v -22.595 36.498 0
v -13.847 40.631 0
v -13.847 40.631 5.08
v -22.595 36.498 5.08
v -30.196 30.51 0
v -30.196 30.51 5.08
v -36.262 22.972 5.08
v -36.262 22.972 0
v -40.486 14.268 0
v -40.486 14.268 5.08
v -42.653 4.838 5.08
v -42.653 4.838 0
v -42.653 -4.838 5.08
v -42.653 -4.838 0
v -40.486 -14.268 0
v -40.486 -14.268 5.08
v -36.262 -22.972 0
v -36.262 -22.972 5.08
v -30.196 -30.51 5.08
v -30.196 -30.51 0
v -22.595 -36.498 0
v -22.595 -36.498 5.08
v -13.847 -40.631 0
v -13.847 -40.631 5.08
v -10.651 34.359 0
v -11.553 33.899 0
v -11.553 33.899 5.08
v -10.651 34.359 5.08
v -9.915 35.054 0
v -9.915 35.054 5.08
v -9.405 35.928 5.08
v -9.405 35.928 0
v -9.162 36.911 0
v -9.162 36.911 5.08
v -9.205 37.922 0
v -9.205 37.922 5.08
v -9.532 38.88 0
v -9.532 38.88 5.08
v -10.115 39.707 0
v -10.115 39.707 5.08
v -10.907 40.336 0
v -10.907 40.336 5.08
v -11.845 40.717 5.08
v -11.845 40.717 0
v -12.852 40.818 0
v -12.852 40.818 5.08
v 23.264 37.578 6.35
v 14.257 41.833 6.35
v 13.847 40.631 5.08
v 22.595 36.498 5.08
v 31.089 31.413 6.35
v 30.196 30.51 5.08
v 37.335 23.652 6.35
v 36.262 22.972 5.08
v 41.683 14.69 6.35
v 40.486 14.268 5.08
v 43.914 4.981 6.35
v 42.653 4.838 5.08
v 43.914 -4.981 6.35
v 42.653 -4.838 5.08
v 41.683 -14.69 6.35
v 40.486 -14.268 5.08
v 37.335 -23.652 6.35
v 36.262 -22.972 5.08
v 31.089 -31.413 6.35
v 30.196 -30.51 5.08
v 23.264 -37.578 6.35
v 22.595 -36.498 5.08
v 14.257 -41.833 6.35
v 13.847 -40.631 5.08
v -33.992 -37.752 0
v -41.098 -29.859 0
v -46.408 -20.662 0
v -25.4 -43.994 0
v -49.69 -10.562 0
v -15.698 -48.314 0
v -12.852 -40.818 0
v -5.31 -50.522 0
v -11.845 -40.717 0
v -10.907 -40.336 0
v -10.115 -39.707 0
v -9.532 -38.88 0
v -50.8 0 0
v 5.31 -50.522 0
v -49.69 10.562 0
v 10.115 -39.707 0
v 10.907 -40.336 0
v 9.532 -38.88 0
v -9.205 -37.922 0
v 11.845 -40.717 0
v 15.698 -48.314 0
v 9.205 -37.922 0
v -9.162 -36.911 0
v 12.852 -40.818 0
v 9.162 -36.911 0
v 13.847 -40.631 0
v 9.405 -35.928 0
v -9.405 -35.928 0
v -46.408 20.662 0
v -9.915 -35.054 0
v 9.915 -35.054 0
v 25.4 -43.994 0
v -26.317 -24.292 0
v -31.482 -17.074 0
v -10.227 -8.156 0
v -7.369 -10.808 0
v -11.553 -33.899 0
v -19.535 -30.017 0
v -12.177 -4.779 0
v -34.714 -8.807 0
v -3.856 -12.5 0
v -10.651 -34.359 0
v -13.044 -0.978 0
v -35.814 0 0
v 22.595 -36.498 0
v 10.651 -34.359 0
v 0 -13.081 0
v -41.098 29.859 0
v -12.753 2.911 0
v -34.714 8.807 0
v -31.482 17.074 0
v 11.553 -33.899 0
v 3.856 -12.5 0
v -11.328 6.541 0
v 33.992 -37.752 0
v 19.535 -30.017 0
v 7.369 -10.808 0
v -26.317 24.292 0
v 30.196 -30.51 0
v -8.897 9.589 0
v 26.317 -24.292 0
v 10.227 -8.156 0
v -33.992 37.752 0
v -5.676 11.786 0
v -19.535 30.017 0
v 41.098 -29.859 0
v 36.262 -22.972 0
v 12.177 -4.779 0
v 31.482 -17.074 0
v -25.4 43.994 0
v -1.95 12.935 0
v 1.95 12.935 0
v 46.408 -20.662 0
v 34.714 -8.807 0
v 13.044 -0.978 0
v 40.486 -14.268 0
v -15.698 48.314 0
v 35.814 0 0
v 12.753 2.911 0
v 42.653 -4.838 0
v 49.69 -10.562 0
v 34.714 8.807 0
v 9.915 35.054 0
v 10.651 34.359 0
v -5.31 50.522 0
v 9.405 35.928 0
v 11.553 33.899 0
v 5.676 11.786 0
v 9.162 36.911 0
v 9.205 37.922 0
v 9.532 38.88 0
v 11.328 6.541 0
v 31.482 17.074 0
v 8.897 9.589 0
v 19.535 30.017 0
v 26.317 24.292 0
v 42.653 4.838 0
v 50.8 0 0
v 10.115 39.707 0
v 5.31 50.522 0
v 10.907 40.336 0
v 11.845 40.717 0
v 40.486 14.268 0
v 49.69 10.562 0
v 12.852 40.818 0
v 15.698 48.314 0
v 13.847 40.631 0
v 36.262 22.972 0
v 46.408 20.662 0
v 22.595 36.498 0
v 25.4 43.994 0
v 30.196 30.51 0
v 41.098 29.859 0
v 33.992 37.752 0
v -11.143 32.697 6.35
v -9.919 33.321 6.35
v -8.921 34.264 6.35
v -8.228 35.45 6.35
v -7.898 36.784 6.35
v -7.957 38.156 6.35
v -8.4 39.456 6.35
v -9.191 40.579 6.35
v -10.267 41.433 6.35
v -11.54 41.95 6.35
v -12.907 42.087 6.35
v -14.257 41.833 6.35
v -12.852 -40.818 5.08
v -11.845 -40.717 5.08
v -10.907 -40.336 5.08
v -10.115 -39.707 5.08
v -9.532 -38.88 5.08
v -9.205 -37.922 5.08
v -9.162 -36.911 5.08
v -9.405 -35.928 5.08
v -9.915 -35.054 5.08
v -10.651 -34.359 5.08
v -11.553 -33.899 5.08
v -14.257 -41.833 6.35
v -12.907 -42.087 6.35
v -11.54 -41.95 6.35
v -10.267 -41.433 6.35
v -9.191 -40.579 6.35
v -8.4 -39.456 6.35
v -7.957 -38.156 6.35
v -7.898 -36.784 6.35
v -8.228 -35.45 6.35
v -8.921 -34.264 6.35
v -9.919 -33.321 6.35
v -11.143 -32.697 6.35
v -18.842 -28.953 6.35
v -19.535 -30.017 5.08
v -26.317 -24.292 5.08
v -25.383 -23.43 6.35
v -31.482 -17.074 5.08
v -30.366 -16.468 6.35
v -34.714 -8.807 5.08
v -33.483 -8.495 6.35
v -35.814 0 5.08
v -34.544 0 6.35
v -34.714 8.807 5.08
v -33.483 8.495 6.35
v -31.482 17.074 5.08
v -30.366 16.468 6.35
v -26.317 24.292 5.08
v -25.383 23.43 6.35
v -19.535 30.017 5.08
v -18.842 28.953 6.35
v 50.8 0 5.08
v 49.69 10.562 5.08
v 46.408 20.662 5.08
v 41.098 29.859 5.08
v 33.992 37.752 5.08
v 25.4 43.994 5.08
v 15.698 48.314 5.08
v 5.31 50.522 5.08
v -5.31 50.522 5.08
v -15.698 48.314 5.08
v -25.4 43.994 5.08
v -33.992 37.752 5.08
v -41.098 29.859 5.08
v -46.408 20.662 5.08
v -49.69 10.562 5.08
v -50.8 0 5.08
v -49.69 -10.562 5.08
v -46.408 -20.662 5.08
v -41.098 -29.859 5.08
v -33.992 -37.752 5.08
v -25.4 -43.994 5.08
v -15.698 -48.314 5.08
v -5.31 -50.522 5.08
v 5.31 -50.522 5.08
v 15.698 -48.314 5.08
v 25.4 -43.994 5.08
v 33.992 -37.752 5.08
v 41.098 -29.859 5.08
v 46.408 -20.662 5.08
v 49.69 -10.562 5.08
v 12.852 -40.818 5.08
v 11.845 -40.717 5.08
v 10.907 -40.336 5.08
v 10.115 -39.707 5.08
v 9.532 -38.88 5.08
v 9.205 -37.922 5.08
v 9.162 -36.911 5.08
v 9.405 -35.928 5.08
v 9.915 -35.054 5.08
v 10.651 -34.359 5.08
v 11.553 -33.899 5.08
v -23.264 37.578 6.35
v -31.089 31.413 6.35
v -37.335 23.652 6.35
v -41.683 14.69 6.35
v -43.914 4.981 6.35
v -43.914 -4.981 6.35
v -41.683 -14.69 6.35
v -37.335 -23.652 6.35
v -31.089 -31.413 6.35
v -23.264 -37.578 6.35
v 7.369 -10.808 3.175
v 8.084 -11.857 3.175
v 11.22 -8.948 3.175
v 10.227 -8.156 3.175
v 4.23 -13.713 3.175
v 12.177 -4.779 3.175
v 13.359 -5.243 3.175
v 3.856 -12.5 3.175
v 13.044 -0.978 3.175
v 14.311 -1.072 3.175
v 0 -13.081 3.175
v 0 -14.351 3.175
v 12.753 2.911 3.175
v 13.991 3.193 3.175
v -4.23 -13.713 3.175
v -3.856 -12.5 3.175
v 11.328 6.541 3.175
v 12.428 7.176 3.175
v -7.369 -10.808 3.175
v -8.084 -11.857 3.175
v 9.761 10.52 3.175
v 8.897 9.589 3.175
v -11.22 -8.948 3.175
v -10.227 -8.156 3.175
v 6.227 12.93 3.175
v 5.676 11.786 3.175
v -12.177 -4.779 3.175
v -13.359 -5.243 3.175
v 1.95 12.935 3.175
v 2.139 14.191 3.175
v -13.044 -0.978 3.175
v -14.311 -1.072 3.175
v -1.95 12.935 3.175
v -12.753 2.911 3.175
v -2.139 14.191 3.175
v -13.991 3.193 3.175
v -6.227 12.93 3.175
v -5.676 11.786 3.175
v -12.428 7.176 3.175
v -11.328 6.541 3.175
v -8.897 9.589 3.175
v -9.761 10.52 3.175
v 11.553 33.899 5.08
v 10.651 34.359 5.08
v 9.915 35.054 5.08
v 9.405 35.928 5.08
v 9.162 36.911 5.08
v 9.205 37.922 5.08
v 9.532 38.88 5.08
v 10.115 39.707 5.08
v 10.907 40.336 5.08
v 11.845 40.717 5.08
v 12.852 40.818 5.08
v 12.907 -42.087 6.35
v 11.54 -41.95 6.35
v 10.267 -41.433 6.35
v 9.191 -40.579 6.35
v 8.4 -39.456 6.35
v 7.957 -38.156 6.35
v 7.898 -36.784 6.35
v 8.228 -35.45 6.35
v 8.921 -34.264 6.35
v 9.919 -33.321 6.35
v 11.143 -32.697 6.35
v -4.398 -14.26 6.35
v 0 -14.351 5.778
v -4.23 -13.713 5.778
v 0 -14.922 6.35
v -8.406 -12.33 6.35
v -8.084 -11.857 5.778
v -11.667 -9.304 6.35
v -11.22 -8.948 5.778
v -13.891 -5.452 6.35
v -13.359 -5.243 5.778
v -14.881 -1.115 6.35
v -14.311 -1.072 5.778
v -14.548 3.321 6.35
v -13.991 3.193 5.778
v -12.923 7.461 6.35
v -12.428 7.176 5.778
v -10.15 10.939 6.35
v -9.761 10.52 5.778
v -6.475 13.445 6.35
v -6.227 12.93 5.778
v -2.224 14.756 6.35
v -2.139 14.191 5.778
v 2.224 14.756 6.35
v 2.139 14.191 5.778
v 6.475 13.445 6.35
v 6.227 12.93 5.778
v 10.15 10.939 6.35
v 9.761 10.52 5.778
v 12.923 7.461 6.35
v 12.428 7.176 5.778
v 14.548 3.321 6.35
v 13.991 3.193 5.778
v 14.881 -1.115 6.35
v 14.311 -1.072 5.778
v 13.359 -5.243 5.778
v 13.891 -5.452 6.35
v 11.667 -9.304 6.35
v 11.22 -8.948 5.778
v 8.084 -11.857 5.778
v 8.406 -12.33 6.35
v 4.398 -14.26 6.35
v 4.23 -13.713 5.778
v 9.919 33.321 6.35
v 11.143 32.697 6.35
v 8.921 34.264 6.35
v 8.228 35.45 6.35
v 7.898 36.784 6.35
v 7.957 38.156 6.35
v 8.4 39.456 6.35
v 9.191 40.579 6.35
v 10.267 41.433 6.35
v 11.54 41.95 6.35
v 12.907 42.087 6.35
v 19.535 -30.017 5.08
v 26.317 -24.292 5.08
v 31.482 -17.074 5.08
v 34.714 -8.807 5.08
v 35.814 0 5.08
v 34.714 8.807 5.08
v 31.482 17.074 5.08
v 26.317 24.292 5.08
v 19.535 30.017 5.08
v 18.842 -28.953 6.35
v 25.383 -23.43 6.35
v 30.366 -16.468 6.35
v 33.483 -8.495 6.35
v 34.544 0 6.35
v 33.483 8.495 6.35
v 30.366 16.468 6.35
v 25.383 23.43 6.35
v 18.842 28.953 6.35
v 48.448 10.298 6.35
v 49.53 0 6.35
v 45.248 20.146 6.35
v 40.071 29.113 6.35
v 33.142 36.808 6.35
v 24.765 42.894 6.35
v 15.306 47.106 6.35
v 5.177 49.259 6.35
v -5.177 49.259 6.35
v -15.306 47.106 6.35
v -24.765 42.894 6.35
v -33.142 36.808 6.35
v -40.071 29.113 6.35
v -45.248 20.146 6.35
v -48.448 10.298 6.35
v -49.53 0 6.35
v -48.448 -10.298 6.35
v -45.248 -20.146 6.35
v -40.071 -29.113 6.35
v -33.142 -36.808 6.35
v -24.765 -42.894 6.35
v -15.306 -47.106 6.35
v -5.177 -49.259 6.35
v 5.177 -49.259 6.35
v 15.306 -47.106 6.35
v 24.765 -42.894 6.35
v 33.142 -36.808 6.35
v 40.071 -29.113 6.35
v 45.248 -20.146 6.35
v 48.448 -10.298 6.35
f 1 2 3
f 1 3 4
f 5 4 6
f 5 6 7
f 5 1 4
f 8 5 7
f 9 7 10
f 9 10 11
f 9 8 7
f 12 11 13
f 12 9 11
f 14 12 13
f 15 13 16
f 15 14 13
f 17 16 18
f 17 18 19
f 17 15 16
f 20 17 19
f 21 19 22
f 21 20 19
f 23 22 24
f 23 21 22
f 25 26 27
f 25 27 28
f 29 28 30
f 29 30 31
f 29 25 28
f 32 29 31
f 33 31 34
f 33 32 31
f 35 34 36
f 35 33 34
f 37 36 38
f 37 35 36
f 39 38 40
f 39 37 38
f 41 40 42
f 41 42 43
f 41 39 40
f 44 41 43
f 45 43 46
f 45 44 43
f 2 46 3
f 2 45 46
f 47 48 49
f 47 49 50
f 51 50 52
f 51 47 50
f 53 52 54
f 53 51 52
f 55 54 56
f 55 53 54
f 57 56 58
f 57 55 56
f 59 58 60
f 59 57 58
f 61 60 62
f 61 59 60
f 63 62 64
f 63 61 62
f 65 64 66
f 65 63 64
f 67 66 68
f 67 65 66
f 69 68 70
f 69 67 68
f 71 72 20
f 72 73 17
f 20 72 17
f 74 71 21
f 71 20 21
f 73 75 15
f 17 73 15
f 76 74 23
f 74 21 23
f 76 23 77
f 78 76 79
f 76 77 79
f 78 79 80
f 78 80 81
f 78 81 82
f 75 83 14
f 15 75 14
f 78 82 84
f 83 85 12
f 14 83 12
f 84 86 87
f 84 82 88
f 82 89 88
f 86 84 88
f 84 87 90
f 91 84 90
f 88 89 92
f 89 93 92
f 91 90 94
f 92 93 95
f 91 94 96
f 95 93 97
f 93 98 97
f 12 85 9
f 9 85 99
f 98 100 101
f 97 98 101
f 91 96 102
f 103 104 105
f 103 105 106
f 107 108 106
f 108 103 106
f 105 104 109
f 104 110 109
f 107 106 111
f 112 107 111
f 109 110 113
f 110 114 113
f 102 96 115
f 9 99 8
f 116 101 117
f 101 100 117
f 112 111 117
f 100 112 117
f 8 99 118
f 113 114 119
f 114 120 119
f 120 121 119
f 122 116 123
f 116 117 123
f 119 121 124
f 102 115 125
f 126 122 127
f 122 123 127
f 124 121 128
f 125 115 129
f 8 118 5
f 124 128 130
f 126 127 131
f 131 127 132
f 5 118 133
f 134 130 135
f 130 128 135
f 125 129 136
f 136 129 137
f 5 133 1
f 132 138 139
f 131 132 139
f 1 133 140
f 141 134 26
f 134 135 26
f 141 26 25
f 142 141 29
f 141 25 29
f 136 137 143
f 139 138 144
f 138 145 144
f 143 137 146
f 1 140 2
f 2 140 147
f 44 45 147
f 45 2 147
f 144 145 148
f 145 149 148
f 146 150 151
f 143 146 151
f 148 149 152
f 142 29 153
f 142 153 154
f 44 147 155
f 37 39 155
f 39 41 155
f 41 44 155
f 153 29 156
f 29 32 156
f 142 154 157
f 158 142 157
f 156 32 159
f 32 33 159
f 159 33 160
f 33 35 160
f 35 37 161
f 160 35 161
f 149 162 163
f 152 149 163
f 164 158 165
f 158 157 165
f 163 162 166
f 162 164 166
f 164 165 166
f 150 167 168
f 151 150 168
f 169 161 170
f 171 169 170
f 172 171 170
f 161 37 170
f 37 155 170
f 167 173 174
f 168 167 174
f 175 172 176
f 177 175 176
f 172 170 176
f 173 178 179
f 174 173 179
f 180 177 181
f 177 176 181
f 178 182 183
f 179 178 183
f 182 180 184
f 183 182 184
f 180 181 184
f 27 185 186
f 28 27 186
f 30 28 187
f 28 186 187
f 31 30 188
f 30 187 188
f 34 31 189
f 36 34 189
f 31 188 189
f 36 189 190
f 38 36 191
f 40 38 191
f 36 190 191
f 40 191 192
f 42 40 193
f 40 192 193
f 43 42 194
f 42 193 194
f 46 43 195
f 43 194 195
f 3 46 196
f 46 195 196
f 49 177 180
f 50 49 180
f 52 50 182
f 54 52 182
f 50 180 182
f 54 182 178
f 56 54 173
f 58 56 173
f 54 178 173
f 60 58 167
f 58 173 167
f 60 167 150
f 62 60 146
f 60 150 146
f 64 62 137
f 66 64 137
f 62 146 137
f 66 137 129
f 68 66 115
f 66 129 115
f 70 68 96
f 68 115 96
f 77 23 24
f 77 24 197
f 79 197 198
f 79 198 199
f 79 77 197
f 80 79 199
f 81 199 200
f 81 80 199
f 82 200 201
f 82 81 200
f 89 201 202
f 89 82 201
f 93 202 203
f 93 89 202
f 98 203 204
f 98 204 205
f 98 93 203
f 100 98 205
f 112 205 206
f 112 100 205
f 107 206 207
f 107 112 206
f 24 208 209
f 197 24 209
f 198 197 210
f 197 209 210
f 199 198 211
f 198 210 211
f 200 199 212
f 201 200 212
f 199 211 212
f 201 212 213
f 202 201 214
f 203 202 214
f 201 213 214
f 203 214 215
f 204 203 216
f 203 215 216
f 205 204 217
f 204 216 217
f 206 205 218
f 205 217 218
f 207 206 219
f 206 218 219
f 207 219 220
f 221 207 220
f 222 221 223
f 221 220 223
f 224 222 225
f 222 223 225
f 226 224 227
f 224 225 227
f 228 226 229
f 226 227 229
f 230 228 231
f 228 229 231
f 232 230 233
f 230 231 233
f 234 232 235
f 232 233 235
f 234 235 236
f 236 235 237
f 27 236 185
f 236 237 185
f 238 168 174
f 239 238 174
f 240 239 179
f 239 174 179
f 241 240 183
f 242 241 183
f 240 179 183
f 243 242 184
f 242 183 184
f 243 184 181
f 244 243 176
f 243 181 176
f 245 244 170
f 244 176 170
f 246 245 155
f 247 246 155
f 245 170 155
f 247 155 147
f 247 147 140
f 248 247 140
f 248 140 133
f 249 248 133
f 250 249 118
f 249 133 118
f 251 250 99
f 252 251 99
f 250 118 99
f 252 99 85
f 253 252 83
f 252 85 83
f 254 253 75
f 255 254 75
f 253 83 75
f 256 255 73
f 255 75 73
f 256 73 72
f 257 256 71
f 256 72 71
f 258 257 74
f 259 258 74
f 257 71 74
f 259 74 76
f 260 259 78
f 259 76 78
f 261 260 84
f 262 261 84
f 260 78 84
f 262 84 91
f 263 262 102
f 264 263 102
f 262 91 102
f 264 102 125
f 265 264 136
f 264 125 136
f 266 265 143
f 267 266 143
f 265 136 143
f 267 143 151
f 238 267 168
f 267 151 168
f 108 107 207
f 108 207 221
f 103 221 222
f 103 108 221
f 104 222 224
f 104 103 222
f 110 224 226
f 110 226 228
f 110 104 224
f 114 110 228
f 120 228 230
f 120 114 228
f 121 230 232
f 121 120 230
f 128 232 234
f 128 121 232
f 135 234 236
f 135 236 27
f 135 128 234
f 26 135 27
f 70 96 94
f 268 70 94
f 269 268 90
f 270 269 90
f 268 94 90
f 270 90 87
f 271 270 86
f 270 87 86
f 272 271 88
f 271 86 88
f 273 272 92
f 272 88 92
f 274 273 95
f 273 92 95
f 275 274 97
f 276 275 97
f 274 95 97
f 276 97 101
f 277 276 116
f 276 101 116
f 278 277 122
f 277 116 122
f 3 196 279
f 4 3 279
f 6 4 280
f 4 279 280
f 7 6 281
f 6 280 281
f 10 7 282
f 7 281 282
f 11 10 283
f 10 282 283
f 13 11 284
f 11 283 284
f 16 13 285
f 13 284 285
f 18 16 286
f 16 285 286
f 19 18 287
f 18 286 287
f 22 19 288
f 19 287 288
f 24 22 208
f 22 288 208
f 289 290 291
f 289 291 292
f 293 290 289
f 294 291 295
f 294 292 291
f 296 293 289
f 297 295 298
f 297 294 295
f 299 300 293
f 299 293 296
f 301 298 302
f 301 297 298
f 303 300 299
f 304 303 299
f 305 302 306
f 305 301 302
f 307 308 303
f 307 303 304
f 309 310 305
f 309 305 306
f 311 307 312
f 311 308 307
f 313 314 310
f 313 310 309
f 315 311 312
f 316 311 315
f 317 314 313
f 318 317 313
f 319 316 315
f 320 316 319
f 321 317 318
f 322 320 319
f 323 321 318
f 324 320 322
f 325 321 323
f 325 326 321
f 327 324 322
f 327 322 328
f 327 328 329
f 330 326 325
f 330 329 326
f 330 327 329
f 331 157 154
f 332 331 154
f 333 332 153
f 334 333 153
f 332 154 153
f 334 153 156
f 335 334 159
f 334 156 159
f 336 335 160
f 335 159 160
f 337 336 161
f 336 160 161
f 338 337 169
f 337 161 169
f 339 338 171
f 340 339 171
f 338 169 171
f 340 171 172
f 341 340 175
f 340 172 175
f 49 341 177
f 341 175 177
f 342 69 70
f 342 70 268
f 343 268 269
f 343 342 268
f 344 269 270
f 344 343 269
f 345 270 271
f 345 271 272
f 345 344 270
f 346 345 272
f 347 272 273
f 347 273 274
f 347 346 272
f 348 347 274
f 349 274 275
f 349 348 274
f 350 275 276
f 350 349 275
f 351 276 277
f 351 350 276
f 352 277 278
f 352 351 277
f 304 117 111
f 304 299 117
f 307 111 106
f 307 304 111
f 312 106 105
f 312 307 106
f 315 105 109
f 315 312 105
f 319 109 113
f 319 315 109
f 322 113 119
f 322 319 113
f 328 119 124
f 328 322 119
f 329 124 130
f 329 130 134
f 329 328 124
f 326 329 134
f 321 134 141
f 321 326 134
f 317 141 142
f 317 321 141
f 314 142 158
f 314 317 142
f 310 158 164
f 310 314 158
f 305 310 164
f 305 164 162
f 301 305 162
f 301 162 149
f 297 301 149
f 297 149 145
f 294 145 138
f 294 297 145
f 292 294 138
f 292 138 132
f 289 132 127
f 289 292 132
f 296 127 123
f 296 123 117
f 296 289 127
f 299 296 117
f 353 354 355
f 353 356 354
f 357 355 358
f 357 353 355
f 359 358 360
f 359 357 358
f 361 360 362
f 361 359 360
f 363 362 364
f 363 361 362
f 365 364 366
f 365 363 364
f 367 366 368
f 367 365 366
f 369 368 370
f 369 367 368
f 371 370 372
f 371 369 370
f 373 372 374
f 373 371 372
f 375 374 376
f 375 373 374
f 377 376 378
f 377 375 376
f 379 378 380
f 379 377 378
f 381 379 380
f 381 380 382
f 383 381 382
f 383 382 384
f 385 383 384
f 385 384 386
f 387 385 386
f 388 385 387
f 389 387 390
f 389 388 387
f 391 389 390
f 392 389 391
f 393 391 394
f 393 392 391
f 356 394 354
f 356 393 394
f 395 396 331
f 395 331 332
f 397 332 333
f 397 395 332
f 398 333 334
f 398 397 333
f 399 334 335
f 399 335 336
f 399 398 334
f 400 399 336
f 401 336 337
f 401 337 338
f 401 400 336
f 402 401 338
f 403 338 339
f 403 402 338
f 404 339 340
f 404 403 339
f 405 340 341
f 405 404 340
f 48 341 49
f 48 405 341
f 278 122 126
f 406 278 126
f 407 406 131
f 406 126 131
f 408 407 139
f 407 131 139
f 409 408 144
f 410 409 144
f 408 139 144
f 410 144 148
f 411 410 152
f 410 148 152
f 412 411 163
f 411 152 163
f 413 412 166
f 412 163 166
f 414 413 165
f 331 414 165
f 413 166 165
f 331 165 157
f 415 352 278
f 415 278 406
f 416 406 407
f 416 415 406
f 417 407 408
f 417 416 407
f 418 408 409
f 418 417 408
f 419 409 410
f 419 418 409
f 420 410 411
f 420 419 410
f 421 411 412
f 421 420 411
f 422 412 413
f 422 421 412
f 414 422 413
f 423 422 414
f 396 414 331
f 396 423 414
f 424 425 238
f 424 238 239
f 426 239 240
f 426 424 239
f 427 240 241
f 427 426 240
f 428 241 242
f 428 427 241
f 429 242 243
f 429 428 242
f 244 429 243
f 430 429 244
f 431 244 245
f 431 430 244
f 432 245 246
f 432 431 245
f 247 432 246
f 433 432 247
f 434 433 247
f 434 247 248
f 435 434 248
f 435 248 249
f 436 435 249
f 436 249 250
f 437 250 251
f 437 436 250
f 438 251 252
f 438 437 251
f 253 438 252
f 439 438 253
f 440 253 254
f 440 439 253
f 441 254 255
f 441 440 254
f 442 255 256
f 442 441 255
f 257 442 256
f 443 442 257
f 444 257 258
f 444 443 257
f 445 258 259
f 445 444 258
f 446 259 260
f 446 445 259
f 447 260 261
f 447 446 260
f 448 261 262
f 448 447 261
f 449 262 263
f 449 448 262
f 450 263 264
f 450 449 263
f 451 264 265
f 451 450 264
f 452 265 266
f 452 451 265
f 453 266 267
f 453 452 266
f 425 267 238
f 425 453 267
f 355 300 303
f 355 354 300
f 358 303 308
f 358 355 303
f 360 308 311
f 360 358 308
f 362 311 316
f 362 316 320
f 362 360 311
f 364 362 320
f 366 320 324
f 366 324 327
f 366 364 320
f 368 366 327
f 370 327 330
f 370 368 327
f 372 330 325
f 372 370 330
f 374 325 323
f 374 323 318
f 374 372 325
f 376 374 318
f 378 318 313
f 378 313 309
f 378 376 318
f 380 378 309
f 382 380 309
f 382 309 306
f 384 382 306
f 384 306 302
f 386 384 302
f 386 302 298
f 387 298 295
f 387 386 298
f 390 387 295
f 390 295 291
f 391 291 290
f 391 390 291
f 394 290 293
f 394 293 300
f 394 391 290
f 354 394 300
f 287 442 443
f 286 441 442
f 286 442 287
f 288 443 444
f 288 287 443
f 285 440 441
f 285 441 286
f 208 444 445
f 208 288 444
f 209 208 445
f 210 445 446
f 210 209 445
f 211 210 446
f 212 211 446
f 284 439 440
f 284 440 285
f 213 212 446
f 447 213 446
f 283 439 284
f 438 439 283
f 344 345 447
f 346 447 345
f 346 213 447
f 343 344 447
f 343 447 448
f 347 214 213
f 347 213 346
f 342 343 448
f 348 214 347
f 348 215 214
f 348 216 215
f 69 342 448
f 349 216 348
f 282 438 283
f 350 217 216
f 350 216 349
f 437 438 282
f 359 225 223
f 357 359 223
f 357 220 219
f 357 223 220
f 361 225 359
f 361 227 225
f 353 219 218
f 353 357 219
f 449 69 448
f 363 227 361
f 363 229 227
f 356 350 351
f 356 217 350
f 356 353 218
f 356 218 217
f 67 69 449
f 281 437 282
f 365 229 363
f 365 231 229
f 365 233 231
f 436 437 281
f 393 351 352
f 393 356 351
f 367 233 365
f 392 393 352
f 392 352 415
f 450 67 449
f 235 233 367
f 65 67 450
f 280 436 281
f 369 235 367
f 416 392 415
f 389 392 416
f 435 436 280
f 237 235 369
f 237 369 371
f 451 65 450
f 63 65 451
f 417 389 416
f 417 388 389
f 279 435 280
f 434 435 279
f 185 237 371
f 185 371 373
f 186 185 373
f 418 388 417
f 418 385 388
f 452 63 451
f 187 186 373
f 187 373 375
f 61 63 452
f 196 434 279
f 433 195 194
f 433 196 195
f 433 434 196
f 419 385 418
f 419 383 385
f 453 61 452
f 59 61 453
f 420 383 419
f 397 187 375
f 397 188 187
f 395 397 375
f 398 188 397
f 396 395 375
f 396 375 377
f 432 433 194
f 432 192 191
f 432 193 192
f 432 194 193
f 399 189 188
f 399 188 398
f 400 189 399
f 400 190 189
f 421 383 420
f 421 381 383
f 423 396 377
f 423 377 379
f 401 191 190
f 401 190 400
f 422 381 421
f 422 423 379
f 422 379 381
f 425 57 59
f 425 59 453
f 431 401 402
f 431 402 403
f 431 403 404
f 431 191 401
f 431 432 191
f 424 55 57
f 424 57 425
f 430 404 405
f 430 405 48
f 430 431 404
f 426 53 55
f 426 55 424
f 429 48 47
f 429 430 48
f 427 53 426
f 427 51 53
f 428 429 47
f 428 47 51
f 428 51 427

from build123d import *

# Parameters (mm, degrees)
SKETCH1_R           = 50.8
BOSS_EXTRUDE1_DEPTH = 6.35
CHAMFER1_SIZE       = 1.27


with BuildPart() as part:
    # Sketch1 → Boss-Extrude1 (new body)
    with BuildSketch(Plane.XY):
        Circle(SKETCH1_R)
        with BuildLine():
            ThreePointArc((-13.847096774, 40.631261203), (-42.926, 0), (-13.847096774, -40.631261203))
            ThreePointArc((-13.847096774, -40.631261203), (-9.334096705, -38.412454682), (-11.552903226, -33.899454613))
            ThreePointArc((-11.552903226, -33.899454613), (-35.814, 0), (-11.552903226, 33.899454613))
            ThreePointArc((-11.552903226, 33.899454613), (-9.334096705, 38.412454682), (-13.847096774, 40.631261203))
        make_face(mode=Mode.SUBTRACT)
        with BuildLine():
            ThreePointArc((13.847096774, 40.631261203), (42.926, 0), (13.847096774, -40.631261203))
            ThreePointArc((13.847096774, -40.631261203), (9.334096705, -38.412454682), (11.552903226, -33.899454613))
            ThreePointArc((11.552903226, -33.899454613), (35.814, 0), (11.552903226, 33.899454613))
            ThreePointArc((11.552903226, 33.899454613), (9.334096705, 38.412454682), (13.847096774, 40.631261203))
        make_face(mode=Mode.SUBTRACT)
    extrude(amount=BOSS_EXTRUDE1_DEPTH)

    # Chamfer1
    chamfer1_edges = [part.edges().sort_by_distance(p)[0] for p in [
        (-9.334096705, -38.412454682, 6.35),
        (-35.814, 0, 6.35),
        (9.334096705, 38.412454682, 6.35),
        (35.814, 0, 6.35),
        (9.334096705, -38.412454682, 6.35),
        (42.926, 0, 6.35),
        (-50.8, 0, 6.35),
        (-9.334096705, 38.412454682, 6.35),
        (-42.926, 0, 6.35),
    ]]
    chamfer(chamfer1_edges, length=CHAMFER1_SIZE)

    # Sketch5 → CBORE for 1/2 Heavy Hex Bolt1 (revolve, cut)
    with BuildSketch(Plane(origin=(0, 0, 6.35), x_dir=(0, -1, 0), z_dir=(1, 0, 0))):
        Polygon((0, 0), (0, 6.35), (13.081, 6.35), (13.081, 3.175), (14.351, 3.175), (14.351, 0.5715), (14.9225, 0), align=None)
    revolve(axis=Axis((0, 0, 12.7), (0, 0, -1)), mode=Mode.SUBTRACT)


solid = part.part
